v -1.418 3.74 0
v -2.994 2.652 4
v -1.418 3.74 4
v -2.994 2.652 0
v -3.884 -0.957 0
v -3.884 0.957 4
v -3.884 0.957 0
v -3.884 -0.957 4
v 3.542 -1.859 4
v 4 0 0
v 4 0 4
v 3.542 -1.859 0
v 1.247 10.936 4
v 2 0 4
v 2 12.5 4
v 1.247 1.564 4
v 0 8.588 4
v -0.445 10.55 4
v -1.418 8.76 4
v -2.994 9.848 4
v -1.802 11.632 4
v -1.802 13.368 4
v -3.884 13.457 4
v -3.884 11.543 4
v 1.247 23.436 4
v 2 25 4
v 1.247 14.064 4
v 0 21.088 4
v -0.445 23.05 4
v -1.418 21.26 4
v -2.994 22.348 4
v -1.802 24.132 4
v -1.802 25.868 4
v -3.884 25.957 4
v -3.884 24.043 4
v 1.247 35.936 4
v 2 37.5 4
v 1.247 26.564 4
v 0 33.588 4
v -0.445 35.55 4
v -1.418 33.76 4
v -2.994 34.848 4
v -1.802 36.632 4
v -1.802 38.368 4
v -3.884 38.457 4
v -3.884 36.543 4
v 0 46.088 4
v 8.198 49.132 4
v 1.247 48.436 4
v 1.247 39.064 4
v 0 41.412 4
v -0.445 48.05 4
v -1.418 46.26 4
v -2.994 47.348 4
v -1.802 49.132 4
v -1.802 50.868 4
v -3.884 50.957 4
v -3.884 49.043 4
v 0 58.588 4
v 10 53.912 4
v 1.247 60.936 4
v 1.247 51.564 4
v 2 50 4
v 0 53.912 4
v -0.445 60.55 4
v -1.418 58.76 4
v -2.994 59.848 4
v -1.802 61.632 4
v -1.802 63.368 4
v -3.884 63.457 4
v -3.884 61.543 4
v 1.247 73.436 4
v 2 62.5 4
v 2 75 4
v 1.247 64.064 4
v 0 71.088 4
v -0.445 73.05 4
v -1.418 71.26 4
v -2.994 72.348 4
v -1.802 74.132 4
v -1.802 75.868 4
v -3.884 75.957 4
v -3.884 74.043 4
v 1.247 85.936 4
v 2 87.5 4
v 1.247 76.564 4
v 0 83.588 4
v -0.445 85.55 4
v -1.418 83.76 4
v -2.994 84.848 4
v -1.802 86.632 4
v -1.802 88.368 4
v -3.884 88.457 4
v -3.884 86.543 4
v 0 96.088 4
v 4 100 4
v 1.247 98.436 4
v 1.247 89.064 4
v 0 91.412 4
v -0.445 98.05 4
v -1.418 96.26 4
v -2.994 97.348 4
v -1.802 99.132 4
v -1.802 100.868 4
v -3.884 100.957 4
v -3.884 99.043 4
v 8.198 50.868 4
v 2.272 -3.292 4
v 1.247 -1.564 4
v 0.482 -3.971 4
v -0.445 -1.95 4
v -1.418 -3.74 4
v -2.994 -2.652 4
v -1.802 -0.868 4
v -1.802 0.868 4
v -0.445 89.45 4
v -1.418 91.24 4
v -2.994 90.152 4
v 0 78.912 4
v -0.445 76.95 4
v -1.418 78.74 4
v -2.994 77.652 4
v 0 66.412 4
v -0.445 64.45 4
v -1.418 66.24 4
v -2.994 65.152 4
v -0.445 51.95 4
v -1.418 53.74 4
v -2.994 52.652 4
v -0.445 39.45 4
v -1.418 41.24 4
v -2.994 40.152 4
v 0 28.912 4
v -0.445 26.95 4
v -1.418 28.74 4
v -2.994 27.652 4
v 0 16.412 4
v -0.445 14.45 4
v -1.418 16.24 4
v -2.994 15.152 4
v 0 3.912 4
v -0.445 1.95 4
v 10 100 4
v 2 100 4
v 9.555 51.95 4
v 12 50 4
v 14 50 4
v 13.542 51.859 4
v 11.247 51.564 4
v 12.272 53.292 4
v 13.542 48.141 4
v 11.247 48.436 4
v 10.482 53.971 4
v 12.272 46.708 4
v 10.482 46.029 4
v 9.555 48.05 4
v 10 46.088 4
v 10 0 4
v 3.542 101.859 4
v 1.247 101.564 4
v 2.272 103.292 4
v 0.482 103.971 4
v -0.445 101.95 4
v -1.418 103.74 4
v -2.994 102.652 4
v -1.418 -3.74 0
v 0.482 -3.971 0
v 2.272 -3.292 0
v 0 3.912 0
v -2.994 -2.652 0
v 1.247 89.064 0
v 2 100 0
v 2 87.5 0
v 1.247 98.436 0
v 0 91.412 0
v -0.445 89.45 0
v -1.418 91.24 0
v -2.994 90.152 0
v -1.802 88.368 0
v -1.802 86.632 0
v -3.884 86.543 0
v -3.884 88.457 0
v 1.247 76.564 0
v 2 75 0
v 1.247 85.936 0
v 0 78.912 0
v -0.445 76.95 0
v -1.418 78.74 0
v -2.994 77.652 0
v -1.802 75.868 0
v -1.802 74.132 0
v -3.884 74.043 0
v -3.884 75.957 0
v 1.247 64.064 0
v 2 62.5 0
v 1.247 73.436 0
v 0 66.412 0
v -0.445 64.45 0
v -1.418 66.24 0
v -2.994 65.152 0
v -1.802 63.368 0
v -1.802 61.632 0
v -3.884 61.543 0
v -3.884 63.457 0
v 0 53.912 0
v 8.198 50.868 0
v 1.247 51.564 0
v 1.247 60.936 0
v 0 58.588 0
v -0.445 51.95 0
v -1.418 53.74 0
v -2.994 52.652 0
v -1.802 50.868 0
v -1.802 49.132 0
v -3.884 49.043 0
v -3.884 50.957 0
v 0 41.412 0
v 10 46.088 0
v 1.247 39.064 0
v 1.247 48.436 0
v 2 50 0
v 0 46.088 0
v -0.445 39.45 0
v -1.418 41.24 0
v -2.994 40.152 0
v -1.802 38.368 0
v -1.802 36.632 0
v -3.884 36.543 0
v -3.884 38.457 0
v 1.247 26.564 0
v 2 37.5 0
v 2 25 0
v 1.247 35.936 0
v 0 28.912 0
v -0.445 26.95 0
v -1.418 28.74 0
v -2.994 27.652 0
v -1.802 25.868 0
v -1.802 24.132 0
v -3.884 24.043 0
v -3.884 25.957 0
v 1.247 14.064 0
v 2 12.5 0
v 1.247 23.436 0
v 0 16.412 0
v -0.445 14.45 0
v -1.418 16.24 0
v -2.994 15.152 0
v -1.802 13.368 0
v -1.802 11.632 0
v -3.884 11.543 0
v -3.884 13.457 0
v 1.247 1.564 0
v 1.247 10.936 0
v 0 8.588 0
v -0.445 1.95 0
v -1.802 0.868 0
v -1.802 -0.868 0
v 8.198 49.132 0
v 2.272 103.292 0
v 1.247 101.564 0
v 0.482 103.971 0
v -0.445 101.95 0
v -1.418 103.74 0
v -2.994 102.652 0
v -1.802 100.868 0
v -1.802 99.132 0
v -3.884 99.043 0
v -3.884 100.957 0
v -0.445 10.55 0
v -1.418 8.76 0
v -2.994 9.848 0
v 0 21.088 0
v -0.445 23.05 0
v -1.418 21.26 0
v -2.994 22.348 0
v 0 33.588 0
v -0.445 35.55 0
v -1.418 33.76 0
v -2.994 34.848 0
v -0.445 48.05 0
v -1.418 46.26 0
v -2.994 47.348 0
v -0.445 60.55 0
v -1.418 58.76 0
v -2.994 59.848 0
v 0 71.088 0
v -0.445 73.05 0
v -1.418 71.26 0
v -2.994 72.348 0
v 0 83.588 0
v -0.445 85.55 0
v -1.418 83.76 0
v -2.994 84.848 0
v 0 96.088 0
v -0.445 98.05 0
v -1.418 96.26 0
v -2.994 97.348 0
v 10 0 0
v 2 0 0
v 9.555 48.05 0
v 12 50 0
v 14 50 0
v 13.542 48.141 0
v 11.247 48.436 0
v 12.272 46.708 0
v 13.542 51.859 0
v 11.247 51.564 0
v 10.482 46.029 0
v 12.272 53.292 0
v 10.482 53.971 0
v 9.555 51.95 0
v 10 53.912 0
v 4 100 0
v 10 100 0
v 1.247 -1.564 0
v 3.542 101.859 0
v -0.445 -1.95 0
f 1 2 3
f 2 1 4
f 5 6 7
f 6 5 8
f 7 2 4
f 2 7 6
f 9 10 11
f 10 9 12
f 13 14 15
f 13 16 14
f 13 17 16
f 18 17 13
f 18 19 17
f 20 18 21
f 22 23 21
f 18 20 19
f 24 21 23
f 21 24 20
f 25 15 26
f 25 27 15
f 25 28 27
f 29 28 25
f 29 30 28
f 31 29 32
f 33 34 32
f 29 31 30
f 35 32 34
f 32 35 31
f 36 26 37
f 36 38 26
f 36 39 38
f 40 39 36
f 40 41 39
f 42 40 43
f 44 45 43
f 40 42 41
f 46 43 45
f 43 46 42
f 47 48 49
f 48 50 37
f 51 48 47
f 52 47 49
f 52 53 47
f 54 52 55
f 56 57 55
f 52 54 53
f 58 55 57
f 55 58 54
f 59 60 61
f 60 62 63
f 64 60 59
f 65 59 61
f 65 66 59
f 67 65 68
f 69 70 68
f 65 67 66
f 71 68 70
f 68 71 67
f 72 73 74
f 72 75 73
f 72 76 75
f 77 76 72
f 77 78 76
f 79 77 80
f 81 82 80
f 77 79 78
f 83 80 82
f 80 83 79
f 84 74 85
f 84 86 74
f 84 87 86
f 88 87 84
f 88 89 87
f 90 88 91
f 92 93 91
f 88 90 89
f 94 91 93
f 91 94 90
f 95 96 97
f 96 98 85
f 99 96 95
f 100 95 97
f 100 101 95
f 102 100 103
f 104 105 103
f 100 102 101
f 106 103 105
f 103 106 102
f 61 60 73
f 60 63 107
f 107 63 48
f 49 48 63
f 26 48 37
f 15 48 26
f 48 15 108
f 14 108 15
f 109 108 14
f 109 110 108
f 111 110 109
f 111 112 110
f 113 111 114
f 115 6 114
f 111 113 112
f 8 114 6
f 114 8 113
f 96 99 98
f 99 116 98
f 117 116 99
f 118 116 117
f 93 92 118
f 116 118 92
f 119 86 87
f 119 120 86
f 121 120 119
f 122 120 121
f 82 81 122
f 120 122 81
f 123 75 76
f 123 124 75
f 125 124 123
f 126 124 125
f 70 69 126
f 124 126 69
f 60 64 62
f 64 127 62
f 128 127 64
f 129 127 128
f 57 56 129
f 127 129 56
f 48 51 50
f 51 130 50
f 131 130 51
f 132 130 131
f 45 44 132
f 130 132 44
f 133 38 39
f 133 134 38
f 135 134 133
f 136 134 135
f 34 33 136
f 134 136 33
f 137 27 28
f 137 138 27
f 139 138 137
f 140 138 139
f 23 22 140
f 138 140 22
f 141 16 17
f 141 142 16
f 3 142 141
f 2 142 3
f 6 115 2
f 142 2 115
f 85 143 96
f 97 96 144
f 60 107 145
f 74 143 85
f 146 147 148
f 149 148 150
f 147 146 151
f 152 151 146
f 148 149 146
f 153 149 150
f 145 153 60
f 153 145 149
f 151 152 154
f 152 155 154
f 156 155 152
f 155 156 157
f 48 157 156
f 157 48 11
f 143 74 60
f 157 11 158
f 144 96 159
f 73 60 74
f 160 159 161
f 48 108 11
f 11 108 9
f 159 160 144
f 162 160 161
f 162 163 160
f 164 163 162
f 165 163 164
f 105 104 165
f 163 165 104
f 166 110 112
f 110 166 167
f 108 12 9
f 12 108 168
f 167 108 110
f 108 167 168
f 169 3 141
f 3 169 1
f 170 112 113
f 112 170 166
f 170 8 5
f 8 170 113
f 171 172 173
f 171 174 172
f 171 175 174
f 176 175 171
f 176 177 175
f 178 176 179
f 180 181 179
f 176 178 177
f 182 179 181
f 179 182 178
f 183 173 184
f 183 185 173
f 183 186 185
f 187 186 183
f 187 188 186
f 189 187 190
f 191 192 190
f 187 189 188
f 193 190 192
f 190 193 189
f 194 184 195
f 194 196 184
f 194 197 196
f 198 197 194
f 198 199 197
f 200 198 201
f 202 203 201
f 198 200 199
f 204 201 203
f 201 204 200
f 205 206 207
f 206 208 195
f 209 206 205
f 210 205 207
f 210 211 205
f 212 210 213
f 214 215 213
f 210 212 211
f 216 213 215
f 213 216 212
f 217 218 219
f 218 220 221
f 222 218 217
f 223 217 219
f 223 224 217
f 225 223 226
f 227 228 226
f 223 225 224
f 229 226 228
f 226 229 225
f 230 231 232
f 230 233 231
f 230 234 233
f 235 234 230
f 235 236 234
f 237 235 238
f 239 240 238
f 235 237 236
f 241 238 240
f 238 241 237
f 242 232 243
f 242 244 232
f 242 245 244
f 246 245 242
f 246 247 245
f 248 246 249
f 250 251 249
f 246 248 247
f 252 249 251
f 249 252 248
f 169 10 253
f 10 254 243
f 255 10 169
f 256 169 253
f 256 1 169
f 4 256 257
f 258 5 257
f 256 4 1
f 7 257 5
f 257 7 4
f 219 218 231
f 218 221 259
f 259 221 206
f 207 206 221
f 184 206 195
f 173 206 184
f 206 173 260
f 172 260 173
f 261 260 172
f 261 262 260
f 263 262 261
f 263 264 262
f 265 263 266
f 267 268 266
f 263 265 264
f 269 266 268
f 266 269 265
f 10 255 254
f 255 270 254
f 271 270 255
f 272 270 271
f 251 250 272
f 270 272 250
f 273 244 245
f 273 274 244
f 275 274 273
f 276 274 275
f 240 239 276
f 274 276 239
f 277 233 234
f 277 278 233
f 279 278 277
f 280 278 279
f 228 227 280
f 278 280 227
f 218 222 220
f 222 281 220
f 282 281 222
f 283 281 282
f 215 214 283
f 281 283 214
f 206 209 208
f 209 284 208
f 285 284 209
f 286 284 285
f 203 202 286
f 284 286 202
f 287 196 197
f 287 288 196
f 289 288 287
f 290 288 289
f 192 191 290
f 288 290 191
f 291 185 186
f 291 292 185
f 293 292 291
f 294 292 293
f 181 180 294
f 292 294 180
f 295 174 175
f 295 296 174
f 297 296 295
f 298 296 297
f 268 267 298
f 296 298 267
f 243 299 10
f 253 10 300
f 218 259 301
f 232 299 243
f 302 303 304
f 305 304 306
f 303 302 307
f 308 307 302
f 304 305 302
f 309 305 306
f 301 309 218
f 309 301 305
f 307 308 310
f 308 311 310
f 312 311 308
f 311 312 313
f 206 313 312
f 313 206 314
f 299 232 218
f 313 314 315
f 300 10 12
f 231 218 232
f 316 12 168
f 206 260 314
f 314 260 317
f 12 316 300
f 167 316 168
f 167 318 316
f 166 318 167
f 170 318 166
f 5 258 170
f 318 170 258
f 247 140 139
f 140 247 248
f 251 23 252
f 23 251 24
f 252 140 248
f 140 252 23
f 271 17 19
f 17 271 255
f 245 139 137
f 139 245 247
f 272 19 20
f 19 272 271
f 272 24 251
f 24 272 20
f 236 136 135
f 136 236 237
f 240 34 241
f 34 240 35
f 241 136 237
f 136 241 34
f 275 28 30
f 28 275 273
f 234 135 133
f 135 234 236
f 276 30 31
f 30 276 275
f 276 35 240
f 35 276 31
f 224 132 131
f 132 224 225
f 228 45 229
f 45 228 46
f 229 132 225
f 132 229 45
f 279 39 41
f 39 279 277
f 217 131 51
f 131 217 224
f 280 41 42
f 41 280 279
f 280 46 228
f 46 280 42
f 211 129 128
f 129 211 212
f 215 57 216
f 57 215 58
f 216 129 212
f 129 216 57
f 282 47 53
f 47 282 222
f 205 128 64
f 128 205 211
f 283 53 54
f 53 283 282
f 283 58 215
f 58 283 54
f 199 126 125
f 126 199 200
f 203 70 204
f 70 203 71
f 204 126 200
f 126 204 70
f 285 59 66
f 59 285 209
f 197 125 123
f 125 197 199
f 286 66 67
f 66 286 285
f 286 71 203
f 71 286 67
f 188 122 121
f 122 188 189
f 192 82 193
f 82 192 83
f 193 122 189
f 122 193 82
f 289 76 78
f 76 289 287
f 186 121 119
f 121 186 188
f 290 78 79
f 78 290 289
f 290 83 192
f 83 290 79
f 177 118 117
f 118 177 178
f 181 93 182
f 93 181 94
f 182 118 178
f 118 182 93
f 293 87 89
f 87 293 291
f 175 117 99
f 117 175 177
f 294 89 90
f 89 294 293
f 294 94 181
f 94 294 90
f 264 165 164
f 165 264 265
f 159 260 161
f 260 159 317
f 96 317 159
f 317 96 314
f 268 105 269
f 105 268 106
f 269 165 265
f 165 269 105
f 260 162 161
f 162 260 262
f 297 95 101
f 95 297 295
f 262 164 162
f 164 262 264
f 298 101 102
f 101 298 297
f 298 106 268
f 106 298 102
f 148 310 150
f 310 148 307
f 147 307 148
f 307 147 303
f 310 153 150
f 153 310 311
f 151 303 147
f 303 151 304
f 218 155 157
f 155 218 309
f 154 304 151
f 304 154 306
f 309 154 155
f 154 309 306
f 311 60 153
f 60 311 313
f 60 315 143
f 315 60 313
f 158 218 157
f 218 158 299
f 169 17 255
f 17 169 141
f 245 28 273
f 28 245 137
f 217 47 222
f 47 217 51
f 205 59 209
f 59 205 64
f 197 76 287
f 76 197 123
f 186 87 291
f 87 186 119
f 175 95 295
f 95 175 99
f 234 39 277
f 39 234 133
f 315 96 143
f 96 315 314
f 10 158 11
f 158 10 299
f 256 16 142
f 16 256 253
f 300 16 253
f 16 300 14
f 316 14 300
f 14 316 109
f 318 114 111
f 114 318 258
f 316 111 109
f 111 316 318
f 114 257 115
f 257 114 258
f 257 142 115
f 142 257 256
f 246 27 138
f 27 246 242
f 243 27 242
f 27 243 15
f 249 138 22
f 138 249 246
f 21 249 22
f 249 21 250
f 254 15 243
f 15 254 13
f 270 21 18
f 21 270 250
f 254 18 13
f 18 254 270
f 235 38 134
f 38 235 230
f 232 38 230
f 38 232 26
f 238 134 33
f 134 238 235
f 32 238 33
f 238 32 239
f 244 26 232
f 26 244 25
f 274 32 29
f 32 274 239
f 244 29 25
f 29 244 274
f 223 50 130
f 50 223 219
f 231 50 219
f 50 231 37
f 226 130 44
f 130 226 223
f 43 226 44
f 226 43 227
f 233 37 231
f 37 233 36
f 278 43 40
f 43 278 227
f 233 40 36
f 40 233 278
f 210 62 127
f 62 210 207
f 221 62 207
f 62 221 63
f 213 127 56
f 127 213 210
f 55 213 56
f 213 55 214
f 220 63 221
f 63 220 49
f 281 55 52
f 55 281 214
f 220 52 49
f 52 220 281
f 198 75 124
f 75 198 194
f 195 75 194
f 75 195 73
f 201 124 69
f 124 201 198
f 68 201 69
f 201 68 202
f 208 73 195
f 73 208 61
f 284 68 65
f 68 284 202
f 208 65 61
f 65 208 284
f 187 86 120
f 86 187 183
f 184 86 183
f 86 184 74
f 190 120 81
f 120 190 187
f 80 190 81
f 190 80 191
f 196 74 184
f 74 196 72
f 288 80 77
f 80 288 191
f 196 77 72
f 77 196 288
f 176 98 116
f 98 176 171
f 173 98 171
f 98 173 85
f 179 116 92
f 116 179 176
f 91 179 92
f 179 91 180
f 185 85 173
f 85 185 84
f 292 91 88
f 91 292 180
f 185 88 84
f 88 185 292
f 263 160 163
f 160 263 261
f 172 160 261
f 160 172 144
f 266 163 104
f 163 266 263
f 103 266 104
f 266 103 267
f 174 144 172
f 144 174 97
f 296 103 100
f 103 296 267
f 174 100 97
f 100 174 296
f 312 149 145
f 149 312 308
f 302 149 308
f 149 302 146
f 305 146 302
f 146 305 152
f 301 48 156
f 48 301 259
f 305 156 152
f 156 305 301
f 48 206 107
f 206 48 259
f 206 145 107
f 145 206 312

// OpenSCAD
difference(){
    union(){
        translate([10,100./8.*4,0]) cylinder(4,4,4);
        cube([10,100,4]);
        for(i=[0:8]){ translate([0,100./8.*i,0]) cylinder(4,4,4); };
    };
    union(){
        
        translate([10,100./8.*4,0]) cylinder(4,2,2);
        for(i=[0:8]){ translate([0,100./8.*i,0]) cylinder(4,2,2); };
    };
};
